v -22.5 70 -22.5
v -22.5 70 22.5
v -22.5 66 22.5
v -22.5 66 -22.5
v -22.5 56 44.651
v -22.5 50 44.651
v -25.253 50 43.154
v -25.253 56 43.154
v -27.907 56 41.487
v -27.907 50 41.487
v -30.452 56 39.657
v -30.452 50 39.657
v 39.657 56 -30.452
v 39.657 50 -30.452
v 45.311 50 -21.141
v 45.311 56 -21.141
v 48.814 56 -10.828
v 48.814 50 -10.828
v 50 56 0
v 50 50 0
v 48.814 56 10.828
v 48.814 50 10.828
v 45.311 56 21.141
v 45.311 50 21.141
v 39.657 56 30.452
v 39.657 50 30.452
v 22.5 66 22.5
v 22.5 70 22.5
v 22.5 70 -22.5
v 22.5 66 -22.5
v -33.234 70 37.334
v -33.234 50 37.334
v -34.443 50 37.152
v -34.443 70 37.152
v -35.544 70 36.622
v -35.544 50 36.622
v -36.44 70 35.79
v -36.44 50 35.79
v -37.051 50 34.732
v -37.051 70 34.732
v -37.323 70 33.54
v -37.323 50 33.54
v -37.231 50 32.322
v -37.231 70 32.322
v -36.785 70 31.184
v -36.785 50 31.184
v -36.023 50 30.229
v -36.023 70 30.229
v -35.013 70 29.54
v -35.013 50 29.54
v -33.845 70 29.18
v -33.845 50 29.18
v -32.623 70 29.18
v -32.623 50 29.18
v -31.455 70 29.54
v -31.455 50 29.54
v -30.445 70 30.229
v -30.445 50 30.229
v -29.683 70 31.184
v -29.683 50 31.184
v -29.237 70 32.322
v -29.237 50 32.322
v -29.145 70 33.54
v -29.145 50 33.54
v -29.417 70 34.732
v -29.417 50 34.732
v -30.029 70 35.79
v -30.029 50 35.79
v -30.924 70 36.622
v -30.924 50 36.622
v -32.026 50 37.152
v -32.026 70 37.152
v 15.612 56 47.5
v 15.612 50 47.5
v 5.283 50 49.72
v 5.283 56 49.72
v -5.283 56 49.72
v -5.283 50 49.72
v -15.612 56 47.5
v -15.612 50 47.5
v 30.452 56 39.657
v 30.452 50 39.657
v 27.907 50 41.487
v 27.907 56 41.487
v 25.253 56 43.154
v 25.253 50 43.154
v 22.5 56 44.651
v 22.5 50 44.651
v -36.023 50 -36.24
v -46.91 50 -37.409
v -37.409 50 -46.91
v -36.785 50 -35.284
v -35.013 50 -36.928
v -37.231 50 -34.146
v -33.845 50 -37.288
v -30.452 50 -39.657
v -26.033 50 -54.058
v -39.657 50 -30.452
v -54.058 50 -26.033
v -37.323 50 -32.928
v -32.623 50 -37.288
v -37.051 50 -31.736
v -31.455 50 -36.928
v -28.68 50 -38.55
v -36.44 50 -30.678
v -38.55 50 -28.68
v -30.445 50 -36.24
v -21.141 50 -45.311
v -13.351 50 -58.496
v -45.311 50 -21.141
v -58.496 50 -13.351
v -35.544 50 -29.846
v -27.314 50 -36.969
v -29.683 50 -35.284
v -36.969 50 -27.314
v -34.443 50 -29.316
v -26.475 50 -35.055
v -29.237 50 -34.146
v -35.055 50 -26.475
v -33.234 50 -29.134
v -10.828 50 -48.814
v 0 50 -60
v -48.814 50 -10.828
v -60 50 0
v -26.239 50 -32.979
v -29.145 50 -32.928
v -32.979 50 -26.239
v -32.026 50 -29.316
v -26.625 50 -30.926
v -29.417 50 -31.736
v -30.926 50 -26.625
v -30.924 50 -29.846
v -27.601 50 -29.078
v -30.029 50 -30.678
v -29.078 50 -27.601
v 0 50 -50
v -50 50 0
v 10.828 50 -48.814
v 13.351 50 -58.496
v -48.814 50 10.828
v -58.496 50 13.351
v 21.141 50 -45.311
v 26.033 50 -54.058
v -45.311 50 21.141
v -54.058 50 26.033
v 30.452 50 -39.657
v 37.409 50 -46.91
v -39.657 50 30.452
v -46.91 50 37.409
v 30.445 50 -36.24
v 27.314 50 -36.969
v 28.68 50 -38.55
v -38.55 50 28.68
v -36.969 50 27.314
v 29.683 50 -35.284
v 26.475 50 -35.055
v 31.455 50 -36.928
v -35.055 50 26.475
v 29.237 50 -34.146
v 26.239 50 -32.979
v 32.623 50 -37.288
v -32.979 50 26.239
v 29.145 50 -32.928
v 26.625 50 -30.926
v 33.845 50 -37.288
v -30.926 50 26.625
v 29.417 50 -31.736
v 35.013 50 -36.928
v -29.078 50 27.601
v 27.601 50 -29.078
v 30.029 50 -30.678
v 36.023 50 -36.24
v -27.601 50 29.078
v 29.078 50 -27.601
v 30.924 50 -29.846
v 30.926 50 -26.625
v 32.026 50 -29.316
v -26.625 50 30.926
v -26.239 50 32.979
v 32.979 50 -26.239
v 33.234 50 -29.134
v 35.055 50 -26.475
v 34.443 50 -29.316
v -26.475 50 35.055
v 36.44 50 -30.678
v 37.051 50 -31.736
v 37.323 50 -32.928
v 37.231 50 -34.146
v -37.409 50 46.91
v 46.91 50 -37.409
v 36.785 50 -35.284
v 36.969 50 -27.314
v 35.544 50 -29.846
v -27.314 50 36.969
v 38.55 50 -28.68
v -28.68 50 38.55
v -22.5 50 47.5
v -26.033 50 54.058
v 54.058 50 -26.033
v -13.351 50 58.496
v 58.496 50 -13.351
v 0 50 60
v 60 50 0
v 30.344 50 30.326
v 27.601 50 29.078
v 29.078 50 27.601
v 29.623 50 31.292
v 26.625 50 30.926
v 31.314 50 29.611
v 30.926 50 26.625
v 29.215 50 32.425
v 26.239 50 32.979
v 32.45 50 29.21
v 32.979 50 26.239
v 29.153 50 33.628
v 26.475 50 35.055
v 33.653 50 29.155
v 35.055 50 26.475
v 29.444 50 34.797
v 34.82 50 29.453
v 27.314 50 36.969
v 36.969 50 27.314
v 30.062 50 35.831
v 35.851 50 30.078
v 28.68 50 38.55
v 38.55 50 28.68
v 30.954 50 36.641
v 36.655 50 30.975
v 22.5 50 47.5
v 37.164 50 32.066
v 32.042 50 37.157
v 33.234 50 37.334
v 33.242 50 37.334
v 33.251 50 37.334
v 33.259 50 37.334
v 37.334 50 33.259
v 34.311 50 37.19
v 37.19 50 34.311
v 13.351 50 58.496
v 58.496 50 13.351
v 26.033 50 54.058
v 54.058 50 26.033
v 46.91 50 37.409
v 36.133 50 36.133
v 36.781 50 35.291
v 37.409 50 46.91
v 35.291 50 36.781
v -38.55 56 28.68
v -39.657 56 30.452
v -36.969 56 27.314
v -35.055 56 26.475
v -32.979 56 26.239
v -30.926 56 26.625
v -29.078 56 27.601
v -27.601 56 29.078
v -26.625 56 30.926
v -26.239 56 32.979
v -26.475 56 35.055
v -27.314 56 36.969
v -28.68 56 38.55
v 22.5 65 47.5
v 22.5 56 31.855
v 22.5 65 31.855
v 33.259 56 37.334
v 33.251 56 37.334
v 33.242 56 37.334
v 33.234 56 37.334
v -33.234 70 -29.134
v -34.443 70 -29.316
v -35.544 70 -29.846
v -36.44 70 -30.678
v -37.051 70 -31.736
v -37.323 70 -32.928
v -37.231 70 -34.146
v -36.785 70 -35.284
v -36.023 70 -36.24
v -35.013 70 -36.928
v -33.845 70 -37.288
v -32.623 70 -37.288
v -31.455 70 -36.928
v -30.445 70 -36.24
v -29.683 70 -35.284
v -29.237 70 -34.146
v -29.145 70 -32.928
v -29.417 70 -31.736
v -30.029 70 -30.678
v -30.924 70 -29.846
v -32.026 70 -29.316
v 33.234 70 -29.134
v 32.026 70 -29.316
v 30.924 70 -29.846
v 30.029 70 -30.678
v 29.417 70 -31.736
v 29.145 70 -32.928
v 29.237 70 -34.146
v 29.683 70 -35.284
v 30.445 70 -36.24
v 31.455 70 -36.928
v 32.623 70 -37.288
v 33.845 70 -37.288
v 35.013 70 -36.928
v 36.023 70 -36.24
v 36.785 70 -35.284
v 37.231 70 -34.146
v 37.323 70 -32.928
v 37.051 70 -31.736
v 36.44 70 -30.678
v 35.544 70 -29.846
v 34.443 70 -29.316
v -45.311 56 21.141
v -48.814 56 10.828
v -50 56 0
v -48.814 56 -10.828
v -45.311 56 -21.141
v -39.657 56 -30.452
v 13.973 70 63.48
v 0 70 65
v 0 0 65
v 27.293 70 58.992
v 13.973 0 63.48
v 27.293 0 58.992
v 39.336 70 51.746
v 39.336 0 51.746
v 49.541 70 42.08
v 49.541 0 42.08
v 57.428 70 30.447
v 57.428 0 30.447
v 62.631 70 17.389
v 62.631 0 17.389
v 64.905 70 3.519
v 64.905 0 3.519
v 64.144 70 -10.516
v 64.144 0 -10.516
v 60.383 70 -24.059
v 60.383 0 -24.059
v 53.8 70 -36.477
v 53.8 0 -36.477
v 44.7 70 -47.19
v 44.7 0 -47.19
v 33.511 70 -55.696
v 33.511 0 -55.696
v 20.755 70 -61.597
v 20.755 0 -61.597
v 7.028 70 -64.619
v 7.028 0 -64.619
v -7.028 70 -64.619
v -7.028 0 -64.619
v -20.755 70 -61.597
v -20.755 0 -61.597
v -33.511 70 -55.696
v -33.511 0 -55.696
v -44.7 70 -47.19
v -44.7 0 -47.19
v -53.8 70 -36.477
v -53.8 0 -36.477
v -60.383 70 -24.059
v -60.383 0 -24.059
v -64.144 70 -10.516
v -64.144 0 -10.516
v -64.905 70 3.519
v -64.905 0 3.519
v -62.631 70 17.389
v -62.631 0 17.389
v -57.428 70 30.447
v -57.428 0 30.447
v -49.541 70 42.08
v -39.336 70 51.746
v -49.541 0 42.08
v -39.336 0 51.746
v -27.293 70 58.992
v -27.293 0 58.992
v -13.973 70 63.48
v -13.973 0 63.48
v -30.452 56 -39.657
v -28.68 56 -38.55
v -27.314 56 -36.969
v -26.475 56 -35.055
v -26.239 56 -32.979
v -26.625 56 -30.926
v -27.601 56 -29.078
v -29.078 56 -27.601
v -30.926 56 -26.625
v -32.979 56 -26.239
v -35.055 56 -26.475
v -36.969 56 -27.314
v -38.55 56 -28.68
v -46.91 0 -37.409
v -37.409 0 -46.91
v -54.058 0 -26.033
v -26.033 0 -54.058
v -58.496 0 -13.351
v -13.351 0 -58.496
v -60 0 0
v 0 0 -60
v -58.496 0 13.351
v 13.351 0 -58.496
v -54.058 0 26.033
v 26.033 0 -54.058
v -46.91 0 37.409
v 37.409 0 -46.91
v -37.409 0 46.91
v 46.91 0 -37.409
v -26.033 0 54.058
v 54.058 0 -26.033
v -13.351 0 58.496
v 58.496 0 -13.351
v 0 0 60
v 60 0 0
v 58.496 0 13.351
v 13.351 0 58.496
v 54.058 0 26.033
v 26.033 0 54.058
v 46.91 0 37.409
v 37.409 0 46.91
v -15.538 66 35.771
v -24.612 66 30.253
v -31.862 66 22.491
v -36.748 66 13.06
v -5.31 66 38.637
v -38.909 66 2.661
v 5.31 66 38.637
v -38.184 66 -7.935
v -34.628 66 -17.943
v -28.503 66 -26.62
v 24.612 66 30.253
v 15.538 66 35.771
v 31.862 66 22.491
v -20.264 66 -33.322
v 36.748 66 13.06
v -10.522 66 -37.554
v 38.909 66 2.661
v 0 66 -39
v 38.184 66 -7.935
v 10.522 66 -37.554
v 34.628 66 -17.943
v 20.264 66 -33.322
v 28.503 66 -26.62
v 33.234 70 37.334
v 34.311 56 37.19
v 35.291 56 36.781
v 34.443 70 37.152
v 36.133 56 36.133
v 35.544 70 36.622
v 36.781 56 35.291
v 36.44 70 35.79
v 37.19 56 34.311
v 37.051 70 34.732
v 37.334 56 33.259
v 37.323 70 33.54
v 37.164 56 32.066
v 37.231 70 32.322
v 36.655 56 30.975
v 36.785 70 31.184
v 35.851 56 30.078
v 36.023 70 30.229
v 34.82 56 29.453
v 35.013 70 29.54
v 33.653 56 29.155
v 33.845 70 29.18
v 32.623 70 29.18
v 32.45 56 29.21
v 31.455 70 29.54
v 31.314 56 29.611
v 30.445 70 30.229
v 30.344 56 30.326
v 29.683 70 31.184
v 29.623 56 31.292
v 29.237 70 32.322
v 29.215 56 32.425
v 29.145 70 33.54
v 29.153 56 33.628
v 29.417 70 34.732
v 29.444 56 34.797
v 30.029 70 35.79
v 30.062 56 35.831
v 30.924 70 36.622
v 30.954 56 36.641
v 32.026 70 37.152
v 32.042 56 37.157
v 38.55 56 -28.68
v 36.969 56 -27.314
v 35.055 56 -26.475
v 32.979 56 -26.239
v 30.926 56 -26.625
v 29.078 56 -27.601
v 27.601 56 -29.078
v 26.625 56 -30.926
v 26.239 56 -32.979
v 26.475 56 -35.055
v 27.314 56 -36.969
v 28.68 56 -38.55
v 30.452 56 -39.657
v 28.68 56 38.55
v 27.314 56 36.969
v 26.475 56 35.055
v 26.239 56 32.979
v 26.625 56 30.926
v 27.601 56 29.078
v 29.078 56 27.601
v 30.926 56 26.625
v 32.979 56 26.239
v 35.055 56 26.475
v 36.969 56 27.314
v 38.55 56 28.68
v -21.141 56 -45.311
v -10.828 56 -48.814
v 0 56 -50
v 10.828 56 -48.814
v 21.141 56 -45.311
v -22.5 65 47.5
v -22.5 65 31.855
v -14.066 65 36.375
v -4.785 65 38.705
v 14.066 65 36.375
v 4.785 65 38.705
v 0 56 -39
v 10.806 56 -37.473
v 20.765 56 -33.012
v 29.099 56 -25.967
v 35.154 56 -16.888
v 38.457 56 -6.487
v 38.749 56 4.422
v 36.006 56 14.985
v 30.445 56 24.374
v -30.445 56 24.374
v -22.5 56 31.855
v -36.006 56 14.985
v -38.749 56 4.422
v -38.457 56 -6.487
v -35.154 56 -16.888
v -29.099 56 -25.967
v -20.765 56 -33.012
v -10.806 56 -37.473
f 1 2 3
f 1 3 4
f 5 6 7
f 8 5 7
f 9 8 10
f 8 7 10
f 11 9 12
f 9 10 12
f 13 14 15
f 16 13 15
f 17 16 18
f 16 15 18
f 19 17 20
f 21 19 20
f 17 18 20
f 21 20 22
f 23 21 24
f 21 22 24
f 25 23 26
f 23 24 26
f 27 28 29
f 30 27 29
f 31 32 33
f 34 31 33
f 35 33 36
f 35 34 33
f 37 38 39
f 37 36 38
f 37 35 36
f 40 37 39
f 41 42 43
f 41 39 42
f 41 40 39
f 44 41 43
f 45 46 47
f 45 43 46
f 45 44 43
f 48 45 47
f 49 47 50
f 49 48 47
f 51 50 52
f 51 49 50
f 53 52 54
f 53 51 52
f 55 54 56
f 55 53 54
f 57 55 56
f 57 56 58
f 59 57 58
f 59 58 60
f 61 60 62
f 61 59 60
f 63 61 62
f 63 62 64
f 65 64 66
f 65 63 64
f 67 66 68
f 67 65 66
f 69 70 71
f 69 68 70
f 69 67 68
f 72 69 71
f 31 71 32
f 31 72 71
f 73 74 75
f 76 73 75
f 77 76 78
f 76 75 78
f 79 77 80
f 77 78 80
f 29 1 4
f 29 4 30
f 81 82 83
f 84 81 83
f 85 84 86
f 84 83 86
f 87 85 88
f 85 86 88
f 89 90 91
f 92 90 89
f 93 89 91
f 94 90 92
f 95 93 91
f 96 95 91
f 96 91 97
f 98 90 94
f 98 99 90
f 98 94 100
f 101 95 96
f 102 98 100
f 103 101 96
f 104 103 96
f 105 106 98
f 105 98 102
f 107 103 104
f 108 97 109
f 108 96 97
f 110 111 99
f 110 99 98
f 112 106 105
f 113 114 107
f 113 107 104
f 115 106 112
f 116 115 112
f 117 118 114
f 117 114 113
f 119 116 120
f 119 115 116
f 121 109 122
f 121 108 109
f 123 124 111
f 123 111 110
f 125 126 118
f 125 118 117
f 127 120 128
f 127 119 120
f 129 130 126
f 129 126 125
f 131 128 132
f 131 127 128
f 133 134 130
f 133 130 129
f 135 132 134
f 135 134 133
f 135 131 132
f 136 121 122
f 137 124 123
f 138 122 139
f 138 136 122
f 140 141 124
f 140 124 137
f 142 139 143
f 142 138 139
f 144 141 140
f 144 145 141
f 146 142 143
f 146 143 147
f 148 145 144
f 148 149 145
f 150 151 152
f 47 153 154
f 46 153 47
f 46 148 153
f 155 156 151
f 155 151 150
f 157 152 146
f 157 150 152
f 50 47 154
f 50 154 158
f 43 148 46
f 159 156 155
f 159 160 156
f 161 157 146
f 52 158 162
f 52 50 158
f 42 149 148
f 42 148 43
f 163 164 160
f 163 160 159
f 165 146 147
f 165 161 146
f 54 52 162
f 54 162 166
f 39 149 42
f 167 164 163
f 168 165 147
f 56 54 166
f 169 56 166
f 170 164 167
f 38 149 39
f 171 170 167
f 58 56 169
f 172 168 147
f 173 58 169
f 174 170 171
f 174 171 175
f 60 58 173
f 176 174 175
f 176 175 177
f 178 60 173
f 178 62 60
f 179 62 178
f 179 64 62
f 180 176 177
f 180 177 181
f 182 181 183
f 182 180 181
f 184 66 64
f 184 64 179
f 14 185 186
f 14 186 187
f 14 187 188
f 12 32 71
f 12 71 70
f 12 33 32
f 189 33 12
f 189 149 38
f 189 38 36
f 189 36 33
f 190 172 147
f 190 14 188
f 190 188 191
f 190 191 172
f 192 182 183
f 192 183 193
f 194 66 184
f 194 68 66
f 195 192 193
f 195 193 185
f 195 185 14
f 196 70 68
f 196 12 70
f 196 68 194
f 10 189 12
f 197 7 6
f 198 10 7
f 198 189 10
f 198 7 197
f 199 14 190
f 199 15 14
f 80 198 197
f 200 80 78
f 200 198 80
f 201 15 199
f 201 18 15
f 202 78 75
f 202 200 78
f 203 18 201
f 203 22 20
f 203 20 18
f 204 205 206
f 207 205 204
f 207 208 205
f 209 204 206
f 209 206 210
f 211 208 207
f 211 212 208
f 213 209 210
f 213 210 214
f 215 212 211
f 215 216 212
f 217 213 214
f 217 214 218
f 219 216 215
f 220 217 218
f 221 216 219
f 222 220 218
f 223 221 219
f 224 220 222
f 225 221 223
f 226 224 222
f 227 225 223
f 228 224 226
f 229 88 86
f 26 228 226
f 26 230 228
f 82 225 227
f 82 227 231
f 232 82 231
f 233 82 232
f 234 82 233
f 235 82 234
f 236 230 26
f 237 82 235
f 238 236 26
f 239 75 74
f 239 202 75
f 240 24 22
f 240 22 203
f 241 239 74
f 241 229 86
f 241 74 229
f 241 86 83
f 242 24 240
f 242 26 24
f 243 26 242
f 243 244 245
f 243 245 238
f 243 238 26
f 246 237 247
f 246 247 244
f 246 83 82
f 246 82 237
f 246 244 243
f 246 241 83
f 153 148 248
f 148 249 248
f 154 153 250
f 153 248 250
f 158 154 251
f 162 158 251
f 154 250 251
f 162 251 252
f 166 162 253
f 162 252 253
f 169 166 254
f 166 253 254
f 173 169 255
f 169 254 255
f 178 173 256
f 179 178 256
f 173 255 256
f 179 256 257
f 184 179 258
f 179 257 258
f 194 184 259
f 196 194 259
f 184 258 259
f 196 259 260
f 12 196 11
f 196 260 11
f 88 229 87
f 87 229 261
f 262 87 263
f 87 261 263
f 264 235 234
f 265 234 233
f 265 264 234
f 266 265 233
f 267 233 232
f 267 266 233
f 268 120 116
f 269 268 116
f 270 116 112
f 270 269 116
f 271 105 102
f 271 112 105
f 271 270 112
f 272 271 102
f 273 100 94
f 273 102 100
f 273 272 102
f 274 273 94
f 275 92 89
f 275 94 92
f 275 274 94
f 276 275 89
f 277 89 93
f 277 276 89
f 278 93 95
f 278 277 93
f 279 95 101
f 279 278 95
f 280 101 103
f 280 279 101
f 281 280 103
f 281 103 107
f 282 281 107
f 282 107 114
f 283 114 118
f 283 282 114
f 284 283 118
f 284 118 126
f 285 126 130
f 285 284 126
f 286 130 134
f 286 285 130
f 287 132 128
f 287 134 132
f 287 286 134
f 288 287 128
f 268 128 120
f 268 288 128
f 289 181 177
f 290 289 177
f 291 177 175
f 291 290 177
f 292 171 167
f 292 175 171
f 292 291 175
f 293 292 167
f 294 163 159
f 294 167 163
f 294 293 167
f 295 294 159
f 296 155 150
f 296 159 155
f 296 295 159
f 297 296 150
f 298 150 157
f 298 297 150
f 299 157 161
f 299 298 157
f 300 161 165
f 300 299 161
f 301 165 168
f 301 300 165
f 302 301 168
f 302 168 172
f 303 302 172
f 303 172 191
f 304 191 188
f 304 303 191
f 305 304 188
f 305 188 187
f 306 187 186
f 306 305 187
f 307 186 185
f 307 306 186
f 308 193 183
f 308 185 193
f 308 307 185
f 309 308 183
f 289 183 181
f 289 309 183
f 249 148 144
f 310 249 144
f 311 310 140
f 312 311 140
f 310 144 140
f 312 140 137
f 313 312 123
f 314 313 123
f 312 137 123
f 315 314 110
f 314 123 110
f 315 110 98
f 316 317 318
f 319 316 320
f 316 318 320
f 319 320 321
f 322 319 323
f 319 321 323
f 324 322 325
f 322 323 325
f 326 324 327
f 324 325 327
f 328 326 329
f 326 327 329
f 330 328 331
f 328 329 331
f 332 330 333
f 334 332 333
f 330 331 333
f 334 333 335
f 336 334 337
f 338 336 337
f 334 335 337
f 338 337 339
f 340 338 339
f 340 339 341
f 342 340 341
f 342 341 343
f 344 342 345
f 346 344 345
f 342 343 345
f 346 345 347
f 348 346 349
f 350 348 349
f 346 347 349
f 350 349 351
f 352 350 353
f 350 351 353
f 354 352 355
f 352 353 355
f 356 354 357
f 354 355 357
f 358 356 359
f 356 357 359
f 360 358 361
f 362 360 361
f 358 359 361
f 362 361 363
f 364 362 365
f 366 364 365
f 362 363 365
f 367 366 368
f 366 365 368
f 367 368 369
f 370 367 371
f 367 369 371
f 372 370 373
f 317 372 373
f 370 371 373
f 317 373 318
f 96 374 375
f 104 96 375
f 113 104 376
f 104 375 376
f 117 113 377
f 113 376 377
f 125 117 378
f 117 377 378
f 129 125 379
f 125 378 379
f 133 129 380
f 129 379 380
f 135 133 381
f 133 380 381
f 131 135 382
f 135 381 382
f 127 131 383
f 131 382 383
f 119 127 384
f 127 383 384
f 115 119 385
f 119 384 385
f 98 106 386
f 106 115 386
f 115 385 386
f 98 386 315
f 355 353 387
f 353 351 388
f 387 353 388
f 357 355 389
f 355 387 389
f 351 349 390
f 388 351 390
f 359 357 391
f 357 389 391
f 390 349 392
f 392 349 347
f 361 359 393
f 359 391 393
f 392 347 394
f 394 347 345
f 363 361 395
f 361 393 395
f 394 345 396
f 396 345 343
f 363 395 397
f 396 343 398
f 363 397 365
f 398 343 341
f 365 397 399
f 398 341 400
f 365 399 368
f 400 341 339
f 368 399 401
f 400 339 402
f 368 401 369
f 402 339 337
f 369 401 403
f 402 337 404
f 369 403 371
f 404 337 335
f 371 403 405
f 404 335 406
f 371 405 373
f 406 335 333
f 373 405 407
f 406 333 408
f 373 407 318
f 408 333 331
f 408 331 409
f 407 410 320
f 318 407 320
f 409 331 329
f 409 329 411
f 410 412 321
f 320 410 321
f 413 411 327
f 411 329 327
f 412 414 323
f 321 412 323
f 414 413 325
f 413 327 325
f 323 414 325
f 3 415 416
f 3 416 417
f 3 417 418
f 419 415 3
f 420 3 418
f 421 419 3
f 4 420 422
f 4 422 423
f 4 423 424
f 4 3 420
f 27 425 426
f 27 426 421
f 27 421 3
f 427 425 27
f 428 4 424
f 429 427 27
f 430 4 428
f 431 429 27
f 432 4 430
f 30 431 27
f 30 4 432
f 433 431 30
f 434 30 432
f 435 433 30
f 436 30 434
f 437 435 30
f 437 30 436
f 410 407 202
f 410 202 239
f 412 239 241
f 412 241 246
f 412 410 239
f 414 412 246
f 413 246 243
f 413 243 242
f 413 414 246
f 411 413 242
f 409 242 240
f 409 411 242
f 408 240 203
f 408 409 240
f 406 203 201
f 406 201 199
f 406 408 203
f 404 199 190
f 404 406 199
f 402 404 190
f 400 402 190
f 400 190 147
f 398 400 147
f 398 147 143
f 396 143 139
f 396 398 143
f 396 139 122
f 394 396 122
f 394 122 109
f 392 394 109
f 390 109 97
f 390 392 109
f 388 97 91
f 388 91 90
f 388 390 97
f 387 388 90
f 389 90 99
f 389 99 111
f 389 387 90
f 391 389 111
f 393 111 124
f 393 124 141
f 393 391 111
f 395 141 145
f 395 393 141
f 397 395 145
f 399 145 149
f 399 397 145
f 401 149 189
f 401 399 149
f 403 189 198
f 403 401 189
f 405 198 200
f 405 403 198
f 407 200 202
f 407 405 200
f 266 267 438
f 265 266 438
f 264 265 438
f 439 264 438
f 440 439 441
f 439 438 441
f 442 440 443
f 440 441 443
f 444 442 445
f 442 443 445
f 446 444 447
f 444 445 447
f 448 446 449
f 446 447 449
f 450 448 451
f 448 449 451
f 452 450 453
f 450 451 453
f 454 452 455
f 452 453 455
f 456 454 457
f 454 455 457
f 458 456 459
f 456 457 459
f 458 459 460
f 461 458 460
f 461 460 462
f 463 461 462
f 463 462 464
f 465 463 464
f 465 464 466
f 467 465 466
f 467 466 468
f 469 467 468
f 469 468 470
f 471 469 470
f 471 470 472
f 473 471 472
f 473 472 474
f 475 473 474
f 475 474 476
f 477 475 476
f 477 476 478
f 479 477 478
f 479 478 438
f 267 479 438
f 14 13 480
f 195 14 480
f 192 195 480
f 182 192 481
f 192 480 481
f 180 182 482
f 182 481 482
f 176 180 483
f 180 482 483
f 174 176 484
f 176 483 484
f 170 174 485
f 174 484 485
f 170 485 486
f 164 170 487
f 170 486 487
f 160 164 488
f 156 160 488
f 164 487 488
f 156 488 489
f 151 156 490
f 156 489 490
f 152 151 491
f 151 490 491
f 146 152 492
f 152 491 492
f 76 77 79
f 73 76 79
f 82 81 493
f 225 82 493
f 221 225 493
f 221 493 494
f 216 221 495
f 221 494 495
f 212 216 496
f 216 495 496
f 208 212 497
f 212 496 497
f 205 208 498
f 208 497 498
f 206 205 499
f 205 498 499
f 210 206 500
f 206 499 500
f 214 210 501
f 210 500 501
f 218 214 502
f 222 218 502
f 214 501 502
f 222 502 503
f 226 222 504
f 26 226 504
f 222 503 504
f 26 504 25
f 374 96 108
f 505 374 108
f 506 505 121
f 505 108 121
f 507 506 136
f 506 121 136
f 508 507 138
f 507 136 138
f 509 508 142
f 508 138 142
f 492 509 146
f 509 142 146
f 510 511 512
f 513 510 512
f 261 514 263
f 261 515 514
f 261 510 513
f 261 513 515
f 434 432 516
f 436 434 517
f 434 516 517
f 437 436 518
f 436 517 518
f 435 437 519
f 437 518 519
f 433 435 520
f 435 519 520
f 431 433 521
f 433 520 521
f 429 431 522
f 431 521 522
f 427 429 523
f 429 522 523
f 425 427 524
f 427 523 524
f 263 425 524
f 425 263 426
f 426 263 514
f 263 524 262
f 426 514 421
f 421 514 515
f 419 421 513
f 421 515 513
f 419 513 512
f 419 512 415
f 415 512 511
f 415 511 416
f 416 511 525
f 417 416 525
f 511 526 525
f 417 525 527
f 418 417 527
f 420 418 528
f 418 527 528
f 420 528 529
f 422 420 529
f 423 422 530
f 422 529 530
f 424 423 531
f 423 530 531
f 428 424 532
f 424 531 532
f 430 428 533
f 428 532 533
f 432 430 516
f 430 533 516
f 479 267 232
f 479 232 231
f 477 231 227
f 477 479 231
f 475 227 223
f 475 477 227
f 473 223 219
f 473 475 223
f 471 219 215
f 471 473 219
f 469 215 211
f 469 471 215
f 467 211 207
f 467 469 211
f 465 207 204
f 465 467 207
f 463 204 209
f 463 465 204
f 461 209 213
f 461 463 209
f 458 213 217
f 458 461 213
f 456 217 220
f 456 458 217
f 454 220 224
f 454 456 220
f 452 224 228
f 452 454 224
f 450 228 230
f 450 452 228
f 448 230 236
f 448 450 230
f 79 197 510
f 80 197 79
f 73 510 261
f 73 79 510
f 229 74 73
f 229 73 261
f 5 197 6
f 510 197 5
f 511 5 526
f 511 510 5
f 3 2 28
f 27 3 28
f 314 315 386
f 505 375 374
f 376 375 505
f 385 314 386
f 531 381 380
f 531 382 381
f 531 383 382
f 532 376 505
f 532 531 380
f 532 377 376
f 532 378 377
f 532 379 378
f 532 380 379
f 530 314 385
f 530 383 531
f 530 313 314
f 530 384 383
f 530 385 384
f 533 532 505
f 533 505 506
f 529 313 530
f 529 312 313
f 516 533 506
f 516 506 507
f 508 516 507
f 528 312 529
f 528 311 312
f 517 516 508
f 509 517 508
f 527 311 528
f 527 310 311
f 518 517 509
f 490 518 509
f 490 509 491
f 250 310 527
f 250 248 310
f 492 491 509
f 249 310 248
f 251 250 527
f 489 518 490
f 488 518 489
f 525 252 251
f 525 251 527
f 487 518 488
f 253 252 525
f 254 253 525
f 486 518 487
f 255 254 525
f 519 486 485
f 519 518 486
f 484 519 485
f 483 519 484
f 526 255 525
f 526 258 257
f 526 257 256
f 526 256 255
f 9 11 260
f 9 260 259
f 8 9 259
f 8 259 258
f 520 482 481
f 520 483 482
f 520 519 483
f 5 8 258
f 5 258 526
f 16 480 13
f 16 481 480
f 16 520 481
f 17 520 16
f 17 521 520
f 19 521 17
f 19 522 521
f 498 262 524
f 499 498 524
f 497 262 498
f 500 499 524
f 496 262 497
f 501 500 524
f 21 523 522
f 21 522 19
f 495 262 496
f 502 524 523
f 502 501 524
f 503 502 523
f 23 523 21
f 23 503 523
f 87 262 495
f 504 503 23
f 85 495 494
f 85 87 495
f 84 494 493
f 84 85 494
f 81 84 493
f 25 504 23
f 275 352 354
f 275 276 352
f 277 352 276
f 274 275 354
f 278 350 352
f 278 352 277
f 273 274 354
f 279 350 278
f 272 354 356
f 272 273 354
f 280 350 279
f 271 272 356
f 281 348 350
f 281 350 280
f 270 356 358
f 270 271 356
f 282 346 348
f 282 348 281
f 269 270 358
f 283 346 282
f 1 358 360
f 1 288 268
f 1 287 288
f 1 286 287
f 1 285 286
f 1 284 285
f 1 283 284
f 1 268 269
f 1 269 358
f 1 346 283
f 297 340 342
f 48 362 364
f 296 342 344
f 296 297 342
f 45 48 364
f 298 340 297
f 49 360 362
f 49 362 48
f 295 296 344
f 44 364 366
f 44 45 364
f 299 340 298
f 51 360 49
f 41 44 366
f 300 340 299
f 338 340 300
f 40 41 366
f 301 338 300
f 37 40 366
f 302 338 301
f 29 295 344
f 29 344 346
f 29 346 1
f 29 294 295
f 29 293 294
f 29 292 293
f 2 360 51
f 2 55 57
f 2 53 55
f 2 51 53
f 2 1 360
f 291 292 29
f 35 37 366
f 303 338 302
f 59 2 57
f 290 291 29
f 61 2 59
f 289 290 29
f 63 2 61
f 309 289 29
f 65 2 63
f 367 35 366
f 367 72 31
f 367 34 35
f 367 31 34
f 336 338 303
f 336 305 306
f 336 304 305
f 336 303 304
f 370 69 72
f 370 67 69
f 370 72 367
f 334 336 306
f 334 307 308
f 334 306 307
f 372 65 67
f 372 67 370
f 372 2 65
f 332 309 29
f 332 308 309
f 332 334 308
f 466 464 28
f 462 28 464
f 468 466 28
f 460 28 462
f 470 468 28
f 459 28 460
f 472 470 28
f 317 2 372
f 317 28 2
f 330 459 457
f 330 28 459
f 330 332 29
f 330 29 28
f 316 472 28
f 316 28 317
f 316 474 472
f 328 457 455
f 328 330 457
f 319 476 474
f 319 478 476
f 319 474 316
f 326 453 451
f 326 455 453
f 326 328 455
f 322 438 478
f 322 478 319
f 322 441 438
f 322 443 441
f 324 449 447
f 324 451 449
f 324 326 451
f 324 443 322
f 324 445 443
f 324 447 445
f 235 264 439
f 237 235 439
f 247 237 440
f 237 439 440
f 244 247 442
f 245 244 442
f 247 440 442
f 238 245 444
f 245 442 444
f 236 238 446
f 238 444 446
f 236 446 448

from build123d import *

# Parameters (mm, degrees)
SKETCH1_R           = 65
SKETCH1_R_2         = 60
BOSS_EXTRUDE1_DEPTH = 50
SKETCH2_R           = 65
BOSS_EXTRUDE2_DEPTH = 20
SKETCH3_R           = 4.1
SKETCH3_W           = 45
SKETCH3_H           = 45
CUT_EXTRUDE1_DEPTH  = 116.542200083
SKETCH5_W           = 45
SKETCH5_H           = 25
CUT_EXTRUDE2_DEPTH  = 15
SKETCH6_R           = 50
CUT_EXTRUDE3_DEPTH  = 6
SKETCH7_R           = 7
SKETCH7_R_2         = 4.1
BOSS_EXTRUDE3_DEPTH = 6
SKETCH8_R           = 39
CUT_EXTRUDE4_DEPTH  = 10


with BuildPart() as part:
    # Sketch1 → Boss-Extrude1 (new body)
    with BuildSketch(Plane(origin=(0, 0, 0), x_dir=(1, 0, 0), z_dir=(0, 1, 0))):
        with Locations(Location((0, 0, 0), (0, 0, 270))):
            Circle(SKETCH1_R)
        with Locations(Location((0, 0, 0), (0, 0, 270))):
            Circle(SKETCH1_R_2, mode=Mode.SUBTRACT)
    extrude(amount=BOSS_EXTRUDE1_DEPTH)

    # Sketch2 → Boss-Extrude2 (add)
    with BuildSketch(Plane(origin=(0, 50, 0), x_dir=(1, 0, 0), z_dir=(0, 1, 0))):
        with Locations(Location((0, 0, 0), (0, 0, 270))):
            Circle(SKETCH2_R)
    extrude(amount=BOSS_EXTRUDE2_DEPTH)

    # Sketch3 → Cut-Extrude1 (cut, through all)
    with BuildSketch(Plane(origin=(0, 70, 0), x_dir=(1, 0, 0), z_dir=(0, 1, 0))):
        with Locations(Location((-33.234018716, -33.234018716, 0), (0, 0, 270))):
            Circle(SKETCH3_R)
        with Locations(Location((-33.234018716, 33.234018716, 0), (0, 0, 270))):
            Circle(SKETCH3_R)
        with Locations(Location((33.234018716, 33.234018716, 0), (0, 0, 270))):
            Circle(SKETCH3_R)
        with Locations(Location((33.234018716, -33.234018716, 0), (0, 0, 270))):
            Circle(SKETCH3_R)
        Rectangle(SKETCH3_W, SKETCH3_H)
    extrude(amount=-CUT_EXTRUDE1_DEPTH, mode=Mode.SUBTRACT)

    # Sketch5 → Cut-Extrude2 (cut)
    with BuildSketch(Plane.XZ.offset(-50)):
        with Locations((0, 35)):
            Rectangle(SKETCH5_W, SKETCH5_H)
    extrude(amount=-CUT_EXTRUDE2_DEPTH, mode=Mode.SUBTRACT)

    # Sketch6 → Cut-Extrude3 (cut)
    with BuildSketch(Plane.XZ.offset(-50)):
        Circle(SKETCH6_R)
    extrude(amount=-CUT_EXTRUDE3_DEPTH, mode=Mode.SUBTRACT)

    # Sketch7 → Boss-Extrude3 (add)
    # profile 1 of 4: a face of its own
    with BuildSketch(Plane.XZ.offset(-56)):
        with Locations((-33.234018716, -33.234018716)):
            Circle(SKETCH7_R)
        with Locations(Location((-33.234018716, -33.234018716, 0), (0, 0, 90))):
            Circle(SKETCH7_R_2, mode=Mode.SUBTRACT)
    # profile 2 of 4: a face of its own
    with BuildSketch(Plane.XZ.offset(-56)):
        with Locations((-33.234018716, 33.234018716)):
            Circle(SKETCH7_R)
        with Locations(Location((-33.234018716, 33.234018716, 0), (0, 0, 90))):
            Circle(SKETCH7_R_2, mode=Mode.SUBTRACT)
    # profile 3 of 4: a face of its own
    with BuildSketch(Plane.XZ.offset(-56)):
        with Locations((33.234018716, -33.234018716)):
            Circle(SKETCH7_R)
        with Locations(Location((33.234018716, -33.234018716, 0), (0, 0, 90))):
            Circle(SKETCH7_R_2, mode=Mode.SUBTRACT)
    # profile 4 of 4: a face of its own
    with BuildSketch(Plane.XZ.offset(-56)):
        with Locations((33.234018716, 33.234018716)):
            Circle(SKETCH7_R)
        with Locations(Location((33.234018716, 33.234018716, 0), (0, 0, 90))):
            Circle(SKETCH7_R_2, mode=Mode.SUBTRACT)
    extrude(amount=BOSS_EXTRUDE3_DEPTH)

    # Sketch8 → Cut-Extrude4 (cut)
    with BuildSketch(Plane.XZ.offset(-56)):
        with Locations(Location((0, 0, 0), (0, 0, 270))):
            Circle(SKETCH8_R)
    extrude(amount=-CUT_EXTRUDE4_DEPTH, mode=Mode.SUBTRACT)


solid = part.part
